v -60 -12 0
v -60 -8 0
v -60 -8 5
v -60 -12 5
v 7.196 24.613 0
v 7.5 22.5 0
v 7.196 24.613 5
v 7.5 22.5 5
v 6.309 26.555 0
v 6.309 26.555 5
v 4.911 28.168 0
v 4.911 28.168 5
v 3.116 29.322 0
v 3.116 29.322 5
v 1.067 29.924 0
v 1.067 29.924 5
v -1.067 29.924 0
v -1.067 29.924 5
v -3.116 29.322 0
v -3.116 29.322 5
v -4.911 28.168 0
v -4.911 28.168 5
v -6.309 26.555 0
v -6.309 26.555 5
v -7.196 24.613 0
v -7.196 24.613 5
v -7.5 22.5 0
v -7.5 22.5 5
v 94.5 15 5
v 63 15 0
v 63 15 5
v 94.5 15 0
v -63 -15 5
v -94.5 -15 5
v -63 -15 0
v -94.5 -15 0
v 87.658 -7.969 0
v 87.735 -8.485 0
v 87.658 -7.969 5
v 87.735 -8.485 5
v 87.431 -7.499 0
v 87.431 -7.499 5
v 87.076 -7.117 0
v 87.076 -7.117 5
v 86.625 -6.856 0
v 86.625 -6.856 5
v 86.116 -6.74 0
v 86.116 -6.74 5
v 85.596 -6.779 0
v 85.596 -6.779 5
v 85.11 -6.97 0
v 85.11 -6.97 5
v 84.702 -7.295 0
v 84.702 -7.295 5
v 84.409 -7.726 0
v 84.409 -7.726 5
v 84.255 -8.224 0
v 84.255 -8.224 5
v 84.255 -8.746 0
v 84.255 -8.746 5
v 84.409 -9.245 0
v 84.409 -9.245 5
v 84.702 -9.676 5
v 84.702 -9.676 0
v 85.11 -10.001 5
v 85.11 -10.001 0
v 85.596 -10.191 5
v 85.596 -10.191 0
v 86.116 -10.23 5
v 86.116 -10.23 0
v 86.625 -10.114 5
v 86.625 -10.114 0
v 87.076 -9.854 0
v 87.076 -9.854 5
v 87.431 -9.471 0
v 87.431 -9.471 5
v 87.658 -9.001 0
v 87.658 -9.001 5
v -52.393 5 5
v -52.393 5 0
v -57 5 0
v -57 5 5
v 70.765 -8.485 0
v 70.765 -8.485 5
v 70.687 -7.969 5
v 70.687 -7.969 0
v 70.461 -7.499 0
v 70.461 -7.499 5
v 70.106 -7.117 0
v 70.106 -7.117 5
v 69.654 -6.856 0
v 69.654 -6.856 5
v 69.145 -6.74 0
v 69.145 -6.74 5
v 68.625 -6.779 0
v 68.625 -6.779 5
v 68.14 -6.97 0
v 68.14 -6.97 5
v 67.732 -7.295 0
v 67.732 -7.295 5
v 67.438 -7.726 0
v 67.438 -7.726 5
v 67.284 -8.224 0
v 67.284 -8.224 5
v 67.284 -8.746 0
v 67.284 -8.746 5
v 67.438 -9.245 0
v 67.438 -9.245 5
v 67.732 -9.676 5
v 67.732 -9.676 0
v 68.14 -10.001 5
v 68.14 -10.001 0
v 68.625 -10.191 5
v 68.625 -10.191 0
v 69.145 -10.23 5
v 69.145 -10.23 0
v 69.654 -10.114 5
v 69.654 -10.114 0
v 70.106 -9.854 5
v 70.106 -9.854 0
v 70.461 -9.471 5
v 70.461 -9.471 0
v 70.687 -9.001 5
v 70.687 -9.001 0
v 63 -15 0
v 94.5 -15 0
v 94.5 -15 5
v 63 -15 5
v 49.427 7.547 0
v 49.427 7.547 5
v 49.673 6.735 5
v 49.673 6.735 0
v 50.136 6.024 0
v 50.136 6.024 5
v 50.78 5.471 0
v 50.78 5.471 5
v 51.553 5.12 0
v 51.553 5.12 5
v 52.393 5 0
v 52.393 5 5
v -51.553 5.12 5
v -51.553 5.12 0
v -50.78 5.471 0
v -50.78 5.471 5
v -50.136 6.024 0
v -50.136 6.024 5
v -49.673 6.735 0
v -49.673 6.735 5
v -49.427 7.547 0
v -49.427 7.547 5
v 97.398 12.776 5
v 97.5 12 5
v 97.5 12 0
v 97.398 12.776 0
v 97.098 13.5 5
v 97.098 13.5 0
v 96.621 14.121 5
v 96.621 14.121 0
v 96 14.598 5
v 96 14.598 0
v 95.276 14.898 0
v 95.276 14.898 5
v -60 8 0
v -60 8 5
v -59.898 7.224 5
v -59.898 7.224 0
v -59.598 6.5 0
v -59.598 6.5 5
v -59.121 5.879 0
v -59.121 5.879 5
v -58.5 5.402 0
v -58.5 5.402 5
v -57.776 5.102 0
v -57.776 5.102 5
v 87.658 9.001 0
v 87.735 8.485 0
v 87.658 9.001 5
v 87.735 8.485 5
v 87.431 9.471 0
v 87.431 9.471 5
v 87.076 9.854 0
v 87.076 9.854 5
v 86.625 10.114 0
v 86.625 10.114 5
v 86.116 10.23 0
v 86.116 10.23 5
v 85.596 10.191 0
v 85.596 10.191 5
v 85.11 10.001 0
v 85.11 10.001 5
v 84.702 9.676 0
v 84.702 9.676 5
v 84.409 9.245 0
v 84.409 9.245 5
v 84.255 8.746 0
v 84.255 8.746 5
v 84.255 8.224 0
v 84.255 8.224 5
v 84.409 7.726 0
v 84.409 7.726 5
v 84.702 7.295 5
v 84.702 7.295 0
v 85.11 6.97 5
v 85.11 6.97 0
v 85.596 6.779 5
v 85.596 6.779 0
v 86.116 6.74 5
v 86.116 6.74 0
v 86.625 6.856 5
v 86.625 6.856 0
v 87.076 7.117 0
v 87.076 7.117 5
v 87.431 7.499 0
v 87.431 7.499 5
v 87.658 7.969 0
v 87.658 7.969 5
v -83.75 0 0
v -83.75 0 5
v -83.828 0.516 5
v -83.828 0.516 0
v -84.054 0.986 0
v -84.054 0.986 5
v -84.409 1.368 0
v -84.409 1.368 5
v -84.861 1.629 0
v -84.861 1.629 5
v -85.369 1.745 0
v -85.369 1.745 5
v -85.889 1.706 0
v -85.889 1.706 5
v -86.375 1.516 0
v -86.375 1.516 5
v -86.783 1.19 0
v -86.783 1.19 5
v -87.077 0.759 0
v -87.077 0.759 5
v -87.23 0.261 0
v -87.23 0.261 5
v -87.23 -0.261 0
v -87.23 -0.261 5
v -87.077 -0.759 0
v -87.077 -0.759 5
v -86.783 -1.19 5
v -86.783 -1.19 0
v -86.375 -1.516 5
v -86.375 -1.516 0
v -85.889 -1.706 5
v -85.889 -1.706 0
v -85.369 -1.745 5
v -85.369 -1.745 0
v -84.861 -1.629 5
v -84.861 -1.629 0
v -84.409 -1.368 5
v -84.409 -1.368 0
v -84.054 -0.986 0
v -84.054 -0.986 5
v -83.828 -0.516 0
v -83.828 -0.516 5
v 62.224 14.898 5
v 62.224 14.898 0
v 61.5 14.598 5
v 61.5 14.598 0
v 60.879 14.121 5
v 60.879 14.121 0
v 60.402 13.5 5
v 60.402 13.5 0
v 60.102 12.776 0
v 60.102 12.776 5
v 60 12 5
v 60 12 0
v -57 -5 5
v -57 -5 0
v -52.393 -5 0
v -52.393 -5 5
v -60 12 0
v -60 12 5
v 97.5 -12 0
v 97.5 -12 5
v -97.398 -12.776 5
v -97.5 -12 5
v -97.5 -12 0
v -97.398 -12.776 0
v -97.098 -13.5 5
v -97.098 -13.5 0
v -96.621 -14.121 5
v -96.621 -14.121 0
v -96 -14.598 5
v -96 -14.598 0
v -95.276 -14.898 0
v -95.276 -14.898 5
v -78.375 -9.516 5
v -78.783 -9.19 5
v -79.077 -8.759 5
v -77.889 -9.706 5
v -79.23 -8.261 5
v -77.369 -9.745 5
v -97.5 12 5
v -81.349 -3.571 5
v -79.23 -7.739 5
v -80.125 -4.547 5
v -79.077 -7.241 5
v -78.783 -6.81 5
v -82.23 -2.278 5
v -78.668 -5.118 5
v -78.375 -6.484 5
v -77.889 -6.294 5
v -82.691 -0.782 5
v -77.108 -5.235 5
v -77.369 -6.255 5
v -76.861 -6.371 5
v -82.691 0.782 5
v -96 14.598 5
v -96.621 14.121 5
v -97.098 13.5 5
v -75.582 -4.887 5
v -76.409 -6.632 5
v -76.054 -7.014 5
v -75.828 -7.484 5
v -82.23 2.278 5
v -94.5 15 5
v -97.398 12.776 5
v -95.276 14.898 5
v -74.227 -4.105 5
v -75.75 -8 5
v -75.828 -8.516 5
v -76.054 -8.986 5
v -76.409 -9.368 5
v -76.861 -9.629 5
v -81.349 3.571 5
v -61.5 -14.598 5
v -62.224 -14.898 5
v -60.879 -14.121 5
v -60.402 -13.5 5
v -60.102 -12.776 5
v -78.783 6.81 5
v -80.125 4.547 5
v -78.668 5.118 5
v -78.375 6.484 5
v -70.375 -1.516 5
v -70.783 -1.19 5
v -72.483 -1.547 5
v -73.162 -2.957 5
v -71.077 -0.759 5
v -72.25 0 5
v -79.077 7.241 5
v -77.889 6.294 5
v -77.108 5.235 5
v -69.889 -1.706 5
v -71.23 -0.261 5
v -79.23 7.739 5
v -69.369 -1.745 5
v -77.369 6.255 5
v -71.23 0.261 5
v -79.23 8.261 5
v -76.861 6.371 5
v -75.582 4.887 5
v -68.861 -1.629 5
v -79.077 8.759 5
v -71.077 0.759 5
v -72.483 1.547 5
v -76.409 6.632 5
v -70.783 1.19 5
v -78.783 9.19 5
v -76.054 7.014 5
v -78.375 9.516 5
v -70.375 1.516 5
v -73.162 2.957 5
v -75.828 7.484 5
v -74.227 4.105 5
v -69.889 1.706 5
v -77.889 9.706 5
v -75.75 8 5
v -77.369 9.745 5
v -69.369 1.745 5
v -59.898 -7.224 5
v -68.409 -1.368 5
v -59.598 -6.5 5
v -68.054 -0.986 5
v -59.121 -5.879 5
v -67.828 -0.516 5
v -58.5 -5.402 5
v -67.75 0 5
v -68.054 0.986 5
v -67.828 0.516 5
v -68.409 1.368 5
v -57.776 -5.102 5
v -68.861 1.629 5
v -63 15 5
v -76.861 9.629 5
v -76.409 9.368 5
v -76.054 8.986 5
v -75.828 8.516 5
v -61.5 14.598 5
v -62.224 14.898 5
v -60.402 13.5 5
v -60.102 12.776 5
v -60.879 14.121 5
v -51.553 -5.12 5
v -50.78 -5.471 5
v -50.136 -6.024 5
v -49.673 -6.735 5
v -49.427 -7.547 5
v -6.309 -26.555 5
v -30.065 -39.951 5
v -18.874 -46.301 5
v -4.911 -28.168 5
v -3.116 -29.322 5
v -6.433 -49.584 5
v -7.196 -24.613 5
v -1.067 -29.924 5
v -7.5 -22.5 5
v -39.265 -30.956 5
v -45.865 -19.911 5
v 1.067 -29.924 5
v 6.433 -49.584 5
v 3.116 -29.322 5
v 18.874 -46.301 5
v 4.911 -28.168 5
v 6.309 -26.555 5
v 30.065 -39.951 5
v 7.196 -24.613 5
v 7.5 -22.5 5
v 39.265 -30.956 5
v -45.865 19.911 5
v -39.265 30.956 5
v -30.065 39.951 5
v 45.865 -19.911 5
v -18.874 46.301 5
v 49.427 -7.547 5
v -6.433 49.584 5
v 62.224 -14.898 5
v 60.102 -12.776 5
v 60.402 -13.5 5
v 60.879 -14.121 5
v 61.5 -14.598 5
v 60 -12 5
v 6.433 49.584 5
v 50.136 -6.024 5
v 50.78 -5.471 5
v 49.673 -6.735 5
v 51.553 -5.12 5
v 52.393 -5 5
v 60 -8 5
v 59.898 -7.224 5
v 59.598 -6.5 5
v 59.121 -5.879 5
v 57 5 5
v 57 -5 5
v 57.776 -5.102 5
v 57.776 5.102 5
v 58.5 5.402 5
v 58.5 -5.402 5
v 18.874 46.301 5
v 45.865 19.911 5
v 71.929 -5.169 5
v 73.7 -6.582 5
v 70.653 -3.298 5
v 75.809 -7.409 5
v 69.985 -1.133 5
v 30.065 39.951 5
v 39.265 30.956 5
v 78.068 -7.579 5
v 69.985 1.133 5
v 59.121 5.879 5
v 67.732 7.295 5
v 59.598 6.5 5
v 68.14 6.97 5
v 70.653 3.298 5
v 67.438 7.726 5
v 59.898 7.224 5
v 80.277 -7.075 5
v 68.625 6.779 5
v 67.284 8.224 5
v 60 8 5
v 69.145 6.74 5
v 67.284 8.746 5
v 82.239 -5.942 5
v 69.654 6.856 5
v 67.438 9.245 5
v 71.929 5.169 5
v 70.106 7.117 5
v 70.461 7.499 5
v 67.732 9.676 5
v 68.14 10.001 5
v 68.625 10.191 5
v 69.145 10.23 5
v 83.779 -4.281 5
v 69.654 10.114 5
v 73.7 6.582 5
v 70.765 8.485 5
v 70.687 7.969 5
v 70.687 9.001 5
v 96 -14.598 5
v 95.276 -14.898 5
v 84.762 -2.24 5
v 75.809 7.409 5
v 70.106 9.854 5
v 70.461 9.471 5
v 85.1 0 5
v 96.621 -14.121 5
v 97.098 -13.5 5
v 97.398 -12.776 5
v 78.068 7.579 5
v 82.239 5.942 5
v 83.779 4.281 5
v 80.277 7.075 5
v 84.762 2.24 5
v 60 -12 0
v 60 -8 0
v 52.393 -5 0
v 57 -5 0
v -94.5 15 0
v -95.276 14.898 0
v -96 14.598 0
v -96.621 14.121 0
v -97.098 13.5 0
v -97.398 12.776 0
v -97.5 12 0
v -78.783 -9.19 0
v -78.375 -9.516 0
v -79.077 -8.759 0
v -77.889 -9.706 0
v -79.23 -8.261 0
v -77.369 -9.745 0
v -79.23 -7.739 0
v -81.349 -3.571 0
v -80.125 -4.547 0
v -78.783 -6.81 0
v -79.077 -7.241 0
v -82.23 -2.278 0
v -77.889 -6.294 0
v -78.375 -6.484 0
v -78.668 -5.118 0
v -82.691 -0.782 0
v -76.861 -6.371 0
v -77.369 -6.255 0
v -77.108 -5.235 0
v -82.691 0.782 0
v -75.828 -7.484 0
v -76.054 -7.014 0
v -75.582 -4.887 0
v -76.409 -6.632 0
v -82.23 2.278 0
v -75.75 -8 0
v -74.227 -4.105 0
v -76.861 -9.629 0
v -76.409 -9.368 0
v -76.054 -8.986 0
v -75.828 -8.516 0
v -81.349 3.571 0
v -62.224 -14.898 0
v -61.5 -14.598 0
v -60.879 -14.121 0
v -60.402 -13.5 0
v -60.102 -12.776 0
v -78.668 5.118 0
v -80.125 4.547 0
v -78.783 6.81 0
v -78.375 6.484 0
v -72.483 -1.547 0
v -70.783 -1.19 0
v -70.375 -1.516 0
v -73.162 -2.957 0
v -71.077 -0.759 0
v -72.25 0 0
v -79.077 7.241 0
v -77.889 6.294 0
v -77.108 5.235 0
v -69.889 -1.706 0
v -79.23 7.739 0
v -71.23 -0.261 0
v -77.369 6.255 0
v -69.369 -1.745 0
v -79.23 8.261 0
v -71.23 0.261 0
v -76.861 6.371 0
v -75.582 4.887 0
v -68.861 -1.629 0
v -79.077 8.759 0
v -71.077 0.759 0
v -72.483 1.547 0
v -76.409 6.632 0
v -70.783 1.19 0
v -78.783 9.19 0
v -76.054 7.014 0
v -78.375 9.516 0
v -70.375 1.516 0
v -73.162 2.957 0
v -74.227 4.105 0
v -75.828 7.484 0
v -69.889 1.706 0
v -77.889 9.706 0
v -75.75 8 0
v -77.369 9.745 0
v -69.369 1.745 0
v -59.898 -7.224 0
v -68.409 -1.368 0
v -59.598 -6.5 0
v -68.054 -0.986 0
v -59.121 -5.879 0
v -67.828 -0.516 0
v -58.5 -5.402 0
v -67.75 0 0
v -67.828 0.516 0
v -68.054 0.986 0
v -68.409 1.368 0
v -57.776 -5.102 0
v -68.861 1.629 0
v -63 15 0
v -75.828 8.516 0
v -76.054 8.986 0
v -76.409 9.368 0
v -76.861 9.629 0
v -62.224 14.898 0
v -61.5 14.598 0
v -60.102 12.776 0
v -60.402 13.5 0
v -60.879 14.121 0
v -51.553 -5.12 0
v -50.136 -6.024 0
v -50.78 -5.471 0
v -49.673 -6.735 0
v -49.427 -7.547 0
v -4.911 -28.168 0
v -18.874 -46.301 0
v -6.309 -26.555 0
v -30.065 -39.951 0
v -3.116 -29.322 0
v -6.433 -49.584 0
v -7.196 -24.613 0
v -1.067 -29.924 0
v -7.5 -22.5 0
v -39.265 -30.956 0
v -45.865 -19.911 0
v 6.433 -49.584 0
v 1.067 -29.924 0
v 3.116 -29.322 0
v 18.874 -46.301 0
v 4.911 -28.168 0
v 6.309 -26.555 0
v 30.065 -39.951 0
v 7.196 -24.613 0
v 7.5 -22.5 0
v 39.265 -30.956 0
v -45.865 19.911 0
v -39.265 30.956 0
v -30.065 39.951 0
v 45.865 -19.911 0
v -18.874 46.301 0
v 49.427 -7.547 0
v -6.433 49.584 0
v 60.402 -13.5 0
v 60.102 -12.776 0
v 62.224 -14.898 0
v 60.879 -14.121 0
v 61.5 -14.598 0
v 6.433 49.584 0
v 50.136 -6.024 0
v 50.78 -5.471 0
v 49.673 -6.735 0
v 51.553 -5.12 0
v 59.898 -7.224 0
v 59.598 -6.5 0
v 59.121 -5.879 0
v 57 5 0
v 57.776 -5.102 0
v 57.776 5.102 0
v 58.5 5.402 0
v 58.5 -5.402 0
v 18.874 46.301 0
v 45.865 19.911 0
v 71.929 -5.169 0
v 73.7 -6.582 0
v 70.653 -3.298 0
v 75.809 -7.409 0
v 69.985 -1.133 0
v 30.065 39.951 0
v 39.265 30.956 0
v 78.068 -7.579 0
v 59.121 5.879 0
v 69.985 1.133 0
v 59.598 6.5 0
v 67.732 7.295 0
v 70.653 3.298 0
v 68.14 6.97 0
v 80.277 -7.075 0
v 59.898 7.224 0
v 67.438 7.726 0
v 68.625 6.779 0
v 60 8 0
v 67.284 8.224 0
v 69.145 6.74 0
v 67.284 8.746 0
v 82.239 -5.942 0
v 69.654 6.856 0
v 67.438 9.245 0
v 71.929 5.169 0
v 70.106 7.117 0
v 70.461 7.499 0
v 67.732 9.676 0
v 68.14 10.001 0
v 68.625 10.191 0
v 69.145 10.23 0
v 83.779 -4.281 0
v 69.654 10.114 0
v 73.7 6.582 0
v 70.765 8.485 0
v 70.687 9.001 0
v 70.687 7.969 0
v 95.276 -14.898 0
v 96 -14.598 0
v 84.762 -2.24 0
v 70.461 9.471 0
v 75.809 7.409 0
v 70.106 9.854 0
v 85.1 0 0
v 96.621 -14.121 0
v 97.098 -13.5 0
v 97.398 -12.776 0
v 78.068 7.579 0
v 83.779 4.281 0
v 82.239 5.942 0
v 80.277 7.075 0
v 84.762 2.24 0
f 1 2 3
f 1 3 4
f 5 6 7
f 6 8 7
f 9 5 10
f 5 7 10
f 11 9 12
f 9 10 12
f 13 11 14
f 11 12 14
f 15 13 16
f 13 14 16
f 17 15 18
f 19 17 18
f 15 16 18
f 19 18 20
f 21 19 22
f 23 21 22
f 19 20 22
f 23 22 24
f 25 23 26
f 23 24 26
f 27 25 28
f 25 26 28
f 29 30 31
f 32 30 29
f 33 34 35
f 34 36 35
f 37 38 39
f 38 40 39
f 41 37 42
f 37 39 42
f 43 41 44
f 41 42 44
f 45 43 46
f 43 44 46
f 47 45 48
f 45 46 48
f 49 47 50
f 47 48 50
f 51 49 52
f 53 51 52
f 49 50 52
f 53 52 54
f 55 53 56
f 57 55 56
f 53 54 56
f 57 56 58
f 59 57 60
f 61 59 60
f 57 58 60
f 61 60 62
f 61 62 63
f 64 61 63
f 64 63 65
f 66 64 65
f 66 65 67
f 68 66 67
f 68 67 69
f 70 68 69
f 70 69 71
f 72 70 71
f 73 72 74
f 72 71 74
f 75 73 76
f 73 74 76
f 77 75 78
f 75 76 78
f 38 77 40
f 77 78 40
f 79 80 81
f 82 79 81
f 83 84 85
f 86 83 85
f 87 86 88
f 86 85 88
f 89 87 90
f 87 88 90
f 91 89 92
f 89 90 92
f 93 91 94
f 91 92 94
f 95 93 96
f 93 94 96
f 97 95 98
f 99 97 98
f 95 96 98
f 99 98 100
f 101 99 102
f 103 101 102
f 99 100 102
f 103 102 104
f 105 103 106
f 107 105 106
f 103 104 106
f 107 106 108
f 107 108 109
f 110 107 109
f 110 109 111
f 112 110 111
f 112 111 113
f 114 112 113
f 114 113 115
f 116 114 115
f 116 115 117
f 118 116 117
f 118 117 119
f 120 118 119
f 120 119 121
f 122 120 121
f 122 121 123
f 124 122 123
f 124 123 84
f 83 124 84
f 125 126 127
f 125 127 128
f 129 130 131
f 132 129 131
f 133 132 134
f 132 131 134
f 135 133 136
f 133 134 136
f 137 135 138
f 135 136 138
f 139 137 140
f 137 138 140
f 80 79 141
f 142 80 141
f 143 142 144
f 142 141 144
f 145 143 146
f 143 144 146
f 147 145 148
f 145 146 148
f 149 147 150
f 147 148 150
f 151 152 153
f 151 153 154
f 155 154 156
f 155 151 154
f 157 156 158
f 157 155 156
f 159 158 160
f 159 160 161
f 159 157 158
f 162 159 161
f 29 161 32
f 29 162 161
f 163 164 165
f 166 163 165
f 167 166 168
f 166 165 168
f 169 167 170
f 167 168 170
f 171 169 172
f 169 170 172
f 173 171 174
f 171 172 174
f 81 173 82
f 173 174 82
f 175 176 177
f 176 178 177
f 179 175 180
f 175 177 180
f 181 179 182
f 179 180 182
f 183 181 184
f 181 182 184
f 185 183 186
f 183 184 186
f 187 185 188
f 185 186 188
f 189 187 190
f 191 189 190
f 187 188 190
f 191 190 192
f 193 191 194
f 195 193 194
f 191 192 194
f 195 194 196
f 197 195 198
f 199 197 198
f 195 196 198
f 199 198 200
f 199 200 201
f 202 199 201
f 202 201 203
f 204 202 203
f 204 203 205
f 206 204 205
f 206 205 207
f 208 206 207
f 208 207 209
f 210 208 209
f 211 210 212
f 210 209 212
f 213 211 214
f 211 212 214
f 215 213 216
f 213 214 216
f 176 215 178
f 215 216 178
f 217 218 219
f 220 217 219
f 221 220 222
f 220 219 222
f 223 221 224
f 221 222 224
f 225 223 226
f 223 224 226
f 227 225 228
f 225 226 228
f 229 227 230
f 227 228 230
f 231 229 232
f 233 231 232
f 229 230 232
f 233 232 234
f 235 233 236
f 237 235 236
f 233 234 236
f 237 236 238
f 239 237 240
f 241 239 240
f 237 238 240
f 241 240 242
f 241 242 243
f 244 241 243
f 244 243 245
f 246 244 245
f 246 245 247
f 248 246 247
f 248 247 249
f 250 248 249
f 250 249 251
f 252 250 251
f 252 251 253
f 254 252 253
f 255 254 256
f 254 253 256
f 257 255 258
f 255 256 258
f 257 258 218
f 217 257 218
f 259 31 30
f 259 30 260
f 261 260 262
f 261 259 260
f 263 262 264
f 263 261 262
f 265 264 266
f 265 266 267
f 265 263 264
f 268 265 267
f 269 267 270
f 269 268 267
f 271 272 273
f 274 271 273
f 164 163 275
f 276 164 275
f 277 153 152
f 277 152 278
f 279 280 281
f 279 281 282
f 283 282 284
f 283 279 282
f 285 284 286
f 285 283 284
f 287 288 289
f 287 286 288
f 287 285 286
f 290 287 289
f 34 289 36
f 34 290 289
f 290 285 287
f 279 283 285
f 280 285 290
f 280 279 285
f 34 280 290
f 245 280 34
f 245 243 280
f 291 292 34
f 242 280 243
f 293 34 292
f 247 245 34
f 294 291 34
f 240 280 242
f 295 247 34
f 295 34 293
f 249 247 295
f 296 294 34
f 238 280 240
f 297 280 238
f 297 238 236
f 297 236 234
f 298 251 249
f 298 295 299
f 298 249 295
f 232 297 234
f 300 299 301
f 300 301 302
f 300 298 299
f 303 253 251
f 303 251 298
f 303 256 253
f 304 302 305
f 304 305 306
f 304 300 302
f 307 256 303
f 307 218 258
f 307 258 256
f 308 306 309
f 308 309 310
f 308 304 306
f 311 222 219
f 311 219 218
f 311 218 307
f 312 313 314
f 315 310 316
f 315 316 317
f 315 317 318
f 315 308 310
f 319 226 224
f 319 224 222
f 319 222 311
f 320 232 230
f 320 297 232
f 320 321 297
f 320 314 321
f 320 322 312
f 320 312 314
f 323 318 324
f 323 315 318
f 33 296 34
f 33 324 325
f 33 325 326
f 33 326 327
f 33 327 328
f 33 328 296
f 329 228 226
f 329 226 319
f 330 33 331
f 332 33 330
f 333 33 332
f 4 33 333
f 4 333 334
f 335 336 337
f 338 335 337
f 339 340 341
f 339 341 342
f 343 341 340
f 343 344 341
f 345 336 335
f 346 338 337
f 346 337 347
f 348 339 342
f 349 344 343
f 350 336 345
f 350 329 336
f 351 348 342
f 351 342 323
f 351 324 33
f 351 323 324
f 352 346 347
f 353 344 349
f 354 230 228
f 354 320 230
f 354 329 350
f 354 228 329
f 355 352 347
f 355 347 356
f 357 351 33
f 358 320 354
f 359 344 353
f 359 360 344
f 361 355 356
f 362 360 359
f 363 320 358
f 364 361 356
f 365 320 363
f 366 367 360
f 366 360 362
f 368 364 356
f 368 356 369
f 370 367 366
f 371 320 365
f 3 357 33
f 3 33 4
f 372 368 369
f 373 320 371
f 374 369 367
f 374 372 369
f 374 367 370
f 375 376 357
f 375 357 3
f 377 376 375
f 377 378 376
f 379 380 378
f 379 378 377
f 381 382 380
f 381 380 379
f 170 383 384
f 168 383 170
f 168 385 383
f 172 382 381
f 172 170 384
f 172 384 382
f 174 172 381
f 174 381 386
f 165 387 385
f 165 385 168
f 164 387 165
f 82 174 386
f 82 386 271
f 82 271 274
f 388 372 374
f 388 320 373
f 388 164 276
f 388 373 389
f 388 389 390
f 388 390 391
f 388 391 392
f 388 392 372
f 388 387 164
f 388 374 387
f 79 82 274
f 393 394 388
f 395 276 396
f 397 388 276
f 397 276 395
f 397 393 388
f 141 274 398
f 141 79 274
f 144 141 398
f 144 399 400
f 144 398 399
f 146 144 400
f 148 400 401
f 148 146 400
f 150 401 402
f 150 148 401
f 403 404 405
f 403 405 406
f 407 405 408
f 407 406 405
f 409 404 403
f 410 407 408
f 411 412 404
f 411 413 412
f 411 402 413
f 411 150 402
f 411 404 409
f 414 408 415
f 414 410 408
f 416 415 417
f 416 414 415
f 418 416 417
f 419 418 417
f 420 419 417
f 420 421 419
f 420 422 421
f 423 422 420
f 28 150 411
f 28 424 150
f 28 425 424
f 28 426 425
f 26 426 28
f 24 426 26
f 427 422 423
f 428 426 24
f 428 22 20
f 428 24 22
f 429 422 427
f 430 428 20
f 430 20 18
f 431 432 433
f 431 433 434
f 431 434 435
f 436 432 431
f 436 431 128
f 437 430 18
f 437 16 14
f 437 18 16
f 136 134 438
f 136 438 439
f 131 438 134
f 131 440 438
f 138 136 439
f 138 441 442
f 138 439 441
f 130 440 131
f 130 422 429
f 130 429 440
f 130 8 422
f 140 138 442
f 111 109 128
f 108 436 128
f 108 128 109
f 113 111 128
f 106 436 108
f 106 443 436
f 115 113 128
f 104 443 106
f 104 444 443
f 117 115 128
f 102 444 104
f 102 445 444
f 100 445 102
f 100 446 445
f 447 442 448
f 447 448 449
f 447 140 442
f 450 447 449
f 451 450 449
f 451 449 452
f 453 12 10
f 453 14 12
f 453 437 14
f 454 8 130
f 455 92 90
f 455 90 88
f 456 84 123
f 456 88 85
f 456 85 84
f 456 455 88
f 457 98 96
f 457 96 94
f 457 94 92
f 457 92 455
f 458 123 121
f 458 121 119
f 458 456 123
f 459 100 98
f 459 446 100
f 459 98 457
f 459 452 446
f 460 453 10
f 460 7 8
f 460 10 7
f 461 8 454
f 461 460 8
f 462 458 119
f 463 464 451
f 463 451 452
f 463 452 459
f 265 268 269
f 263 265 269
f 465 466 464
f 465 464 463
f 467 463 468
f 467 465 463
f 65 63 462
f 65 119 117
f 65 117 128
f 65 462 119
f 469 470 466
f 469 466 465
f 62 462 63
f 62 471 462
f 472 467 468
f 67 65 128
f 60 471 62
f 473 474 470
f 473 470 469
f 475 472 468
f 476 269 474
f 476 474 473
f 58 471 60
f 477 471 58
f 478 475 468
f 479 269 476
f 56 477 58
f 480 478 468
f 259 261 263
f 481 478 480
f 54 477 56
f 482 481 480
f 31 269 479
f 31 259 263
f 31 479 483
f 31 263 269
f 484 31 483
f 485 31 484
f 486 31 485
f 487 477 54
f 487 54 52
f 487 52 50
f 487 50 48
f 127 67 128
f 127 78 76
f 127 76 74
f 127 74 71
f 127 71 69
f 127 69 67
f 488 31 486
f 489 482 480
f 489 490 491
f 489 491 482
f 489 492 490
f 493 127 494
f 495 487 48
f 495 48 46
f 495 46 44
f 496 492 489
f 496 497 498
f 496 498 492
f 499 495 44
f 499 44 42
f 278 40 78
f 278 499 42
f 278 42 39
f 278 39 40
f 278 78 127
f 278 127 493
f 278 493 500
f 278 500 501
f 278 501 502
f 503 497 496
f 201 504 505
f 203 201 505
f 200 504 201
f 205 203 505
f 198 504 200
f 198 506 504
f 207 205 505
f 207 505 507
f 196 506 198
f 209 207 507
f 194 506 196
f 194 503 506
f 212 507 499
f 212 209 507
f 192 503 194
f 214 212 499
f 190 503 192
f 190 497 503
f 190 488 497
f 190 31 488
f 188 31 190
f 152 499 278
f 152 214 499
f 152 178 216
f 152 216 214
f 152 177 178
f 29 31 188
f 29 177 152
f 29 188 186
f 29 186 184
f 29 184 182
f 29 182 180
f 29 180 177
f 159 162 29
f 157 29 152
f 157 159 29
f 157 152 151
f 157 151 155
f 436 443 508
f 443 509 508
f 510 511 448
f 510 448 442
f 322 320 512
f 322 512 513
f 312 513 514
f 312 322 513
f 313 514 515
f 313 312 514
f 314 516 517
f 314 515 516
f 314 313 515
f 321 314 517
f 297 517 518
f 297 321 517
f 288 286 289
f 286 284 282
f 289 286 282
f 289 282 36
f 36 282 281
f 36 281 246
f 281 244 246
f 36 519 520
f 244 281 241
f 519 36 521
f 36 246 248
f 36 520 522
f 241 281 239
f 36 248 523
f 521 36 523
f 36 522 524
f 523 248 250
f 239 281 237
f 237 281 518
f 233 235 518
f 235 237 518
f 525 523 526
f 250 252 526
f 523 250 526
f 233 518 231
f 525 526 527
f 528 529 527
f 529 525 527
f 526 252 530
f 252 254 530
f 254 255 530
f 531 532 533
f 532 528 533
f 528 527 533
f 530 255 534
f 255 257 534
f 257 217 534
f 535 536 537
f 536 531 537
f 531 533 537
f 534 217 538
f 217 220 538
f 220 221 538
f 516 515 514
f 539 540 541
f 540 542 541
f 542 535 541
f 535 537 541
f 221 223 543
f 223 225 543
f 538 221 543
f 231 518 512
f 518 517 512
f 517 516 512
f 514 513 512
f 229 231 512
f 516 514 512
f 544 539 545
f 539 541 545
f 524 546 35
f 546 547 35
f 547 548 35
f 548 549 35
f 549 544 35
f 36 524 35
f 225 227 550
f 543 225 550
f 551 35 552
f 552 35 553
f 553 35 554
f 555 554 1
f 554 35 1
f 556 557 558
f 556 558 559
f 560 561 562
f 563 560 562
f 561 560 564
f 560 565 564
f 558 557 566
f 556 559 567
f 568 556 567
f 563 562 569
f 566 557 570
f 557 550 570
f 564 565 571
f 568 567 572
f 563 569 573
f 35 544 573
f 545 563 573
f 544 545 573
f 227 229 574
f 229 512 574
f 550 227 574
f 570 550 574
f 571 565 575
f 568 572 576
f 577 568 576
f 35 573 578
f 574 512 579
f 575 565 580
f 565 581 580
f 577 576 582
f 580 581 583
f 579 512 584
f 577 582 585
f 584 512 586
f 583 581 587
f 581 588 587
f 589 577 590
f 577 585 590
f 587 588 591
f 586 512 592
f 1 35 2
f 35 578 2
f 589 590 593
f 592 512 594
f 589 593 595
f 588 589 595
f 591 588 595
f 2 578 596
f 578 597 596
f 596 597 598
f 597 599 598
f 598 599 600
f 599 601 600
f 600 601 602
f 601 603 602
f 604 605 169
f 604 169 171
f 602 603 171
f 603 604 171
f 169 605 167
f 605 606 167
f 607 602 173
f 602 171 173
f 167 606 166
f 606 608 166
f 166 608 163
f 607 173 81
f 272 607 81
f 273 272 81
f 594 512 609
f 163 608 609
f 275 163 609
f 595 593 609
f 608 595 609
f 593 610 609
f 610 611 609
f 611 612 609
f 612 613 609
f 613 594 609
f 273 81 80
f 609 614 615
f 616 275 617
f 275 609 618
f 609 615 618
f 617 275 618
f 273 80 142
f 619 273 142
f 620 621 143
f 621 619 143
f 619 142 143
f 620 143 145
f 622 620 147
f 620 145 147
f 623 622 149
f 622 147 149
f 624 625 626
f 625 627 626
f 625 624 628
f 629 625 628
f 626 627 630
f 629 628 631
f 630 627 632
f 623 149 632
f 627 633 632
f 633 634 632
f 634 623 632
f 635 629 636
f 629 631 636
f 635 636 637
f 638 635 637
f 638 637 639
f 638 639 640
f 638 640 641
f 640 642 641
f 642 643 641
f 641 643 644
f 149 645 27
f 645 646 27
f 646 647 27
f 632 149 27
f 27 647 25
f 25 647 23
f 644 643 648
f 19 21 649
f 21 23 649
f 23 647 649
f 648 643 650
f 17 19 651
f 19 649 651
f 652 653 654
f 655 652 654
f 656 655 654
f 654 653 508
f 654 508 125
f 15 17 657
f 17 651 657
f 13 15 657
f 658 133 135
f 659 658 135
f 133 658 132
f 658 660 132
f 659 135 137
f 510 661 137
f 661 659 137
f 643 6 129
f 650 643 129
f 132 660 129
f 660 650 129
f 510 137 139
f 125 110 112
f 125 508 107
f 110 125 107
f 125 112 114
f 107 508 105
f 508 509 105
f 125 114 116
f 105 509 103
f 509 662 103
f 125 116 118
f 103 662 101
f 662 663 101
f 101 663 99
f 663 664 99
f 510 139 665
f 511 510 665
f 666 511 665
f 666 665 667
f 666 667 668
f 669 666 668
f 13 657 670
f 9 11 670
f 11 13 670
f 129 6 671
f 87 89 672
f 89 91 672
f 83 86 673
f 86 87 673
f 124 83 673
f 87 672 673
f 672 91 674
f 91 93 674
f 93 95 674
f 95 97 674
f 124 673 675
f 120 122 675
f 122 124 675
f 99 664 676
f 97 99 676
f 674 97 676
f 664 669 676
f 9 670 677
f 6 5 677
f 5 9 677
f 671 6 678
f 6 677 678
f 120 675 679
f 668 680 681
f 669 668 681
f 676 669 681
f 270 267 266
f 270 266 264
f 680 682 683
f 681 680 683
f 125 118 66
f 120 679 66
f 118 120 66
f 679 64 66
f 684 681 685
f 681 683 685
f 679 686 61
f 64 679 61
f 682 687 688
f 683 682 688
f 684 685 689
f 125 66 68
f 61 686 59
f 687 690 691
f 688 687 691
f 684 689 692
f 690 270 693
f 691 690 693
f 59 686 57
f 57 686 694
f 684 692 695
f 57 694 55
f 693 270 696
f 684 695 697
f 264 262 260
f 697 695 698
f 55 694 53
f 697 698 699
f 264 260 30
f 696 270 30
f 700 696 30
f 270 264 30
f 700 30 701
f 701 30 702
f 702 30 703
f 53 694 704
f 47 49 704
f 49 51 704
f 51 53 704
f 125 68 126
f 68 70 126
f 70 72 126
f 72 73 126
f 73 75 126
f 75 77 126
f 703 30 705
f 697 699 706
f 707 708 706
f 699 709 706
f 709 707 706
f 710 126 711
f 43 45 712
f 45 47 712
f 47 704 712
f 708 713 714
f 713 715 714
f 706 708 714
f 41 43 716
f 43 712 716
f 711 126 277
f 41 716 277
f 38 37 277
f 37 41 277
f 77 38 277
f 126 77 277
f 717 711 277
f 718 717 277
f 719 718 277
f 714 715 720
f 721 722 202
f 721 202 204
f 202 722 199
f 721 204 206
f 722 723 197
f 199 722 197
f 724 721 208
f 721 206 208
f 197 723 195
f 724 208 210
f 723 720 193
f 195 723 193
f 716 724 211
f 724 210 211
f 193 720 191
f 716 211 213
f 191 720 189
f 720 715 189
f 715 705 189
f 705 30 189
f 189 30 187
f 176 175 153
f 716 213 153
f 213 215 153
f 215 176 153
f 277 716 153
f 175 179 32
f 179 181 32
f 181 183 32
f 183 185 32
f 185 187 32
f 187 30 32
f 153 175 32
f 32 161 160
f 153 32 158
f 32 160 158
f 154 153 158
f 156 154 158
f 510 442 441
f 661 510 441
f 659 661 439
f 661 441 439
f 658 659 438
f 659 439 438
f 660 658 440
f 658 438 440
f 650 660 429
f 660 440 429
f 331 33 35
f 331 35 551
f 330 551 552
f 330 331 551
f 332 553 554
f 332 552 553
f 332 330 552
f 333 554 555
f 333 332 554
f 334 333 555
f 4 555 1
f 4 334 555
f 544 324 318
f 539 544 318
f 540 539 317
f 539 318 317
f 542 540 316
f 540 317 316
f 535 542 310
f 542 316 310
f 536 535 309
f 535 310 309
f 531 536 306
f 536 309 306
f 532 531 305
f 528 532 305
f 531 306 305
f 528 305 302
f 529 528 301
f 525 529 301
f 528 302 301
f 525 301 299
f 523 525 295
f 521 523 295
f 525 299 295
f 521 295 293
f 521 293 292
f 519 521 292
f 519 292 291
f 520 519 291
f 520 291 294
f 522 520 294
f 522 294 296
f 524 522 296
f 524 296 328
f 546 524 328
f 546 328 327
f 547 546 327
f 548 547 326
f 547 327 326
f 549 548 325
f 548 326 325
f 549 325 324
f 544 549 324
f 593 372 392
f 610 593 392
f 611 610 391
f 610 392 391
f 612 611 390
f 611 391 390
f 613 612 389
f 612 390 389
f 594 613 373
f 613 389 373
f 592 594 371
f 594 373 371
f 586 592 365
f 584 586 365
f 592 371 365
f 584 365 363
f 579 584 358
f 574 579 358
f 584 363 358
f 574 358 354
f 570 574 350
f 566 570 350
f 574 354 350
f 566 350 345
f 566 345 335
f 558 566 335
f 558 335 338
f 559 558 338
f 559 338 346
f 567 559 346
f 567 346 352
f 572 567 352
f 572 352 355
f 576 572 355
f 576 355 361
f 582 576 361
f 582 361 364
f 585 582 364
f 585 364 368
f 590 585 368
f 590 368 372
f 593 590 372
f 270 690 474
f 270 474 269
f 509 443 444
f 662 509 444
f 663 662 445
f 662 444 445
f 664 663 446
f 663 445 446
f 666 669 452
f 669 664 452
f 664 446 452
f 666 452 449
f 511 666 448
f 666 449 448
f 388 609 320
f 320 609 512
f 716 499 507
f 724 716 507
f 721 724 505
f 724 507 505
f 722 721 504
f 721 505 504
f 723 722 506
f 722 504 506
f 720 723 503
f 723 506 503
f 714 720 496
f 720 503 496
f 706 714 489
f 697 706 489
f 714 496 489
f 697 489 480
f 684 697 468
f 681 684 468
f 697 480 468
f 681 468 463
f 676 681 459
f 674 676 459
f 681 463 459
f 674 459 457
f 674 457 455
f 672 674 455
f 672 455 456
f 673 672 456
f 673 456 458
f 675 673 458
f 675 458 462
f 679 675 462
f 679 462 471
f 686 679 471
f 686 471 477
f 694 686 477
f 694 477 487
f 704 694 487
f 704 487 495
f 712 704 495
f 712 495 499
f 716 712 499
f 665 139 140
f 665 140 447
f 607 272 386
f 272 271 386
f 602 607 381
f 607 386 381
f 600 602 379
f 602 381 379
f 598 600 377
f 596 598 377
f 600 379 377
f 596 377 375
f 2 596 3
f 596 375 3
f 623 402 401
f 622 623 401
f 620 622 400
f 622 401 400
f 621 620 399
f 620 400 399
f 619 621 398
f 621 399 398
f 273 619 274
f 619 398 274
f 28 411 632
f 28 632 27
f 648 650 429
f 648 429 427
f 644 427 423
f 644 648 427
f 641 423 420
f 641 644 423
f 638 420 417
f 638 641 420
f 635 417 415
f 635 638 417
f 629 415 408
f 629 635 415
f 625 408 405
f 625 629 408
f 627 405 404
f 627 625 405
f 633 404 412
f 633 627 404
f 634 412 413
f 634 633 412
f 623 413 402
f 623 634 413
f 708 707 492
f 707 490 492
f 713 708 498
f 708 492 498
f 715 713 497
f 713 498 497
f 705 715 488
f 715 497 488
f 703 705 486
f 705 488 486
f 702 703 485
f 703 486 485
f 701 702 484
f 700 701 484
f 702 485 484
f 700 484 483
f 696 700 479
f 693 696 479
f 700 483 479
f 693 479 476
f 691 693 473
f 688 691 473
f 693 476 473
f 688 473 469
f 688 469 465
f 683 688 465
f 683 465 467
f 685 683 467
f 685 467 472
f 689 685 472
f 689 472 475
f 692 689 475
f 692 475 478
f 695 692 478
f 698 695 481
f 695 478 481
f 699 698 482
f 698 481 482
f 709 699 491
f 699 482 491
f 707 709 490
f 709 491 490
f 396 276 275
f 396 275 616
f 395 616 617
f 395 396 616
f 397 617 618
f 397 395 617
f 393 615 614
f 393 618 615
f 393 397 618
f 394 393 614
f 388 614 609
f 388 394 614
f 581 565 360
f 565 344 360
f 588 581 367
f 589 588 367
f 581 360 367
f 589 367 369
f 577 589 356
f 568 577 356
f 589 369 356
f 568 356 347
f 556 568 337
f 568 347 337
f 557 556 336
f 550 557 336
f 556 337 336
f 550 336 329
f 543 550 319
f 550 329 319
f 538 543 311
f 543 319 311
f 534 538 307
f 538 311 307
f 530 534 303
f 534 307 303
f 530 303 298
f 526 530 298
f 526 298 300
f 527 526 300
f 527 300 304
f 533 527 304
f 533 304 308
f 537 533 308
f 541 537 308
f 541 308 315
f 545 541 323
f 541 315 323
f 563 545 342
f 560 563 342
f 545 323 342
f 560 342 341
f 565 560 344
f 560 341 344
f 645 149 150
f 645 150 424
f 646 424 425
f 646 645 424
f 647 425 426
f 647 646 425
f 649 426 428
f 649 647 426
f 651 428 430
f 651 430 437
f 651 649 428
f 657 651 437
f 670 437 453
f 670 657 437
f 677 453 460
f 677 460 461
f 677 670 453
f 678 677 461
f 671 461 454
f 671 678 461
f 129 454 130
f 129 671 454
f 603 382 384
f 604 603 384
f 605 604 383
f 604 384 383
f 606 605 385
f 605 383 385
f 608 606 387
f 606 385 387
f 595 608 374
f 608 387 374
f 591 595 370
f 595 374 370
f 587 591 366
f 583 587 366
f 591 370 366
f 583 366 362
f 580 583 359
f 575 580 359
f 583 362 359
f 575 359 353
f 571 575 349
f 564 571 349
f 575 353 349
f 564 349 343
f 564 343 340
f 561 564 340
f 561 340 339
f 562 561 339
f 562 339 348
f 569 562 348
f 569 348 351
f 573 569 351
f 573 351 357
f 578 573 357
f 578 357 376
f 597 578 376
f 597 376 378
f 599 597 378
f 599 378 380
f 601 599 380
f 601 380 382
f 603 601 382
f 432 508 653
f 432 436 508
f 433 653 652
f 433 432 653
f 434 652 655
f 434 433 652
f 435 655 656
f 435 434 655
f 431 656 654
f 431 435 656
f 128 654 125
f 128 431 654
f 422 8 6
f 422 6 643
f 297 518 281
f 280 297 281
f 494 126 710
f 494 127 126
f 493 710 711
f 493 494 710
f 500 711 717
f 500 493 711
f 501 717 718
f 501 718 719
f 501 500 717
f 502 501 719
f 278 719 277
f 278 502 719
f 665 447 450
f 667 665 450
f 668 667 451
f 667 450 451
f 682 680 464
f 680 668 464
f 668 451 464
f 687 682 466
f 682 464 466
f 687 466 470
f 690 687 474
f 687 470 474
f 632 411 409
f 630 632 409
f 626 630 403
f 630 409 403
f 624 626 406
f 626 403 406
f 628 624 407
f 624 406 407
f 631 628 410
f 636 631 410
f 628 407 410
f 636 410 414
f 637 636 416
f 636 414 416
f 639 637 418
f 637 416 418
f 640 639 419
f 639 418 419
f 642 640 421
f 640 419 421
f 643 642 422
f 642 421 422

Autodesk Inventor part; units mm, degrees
ref_plane "YZ Plane" through (0, 0, 0) normal (1, 0, 0) x (0, 1, 0)
ref_plane "XZ Plane" through (0, 0, 0) normal (0, 1, 0) x (-1, 0, 0)
ref_plane "XY Plane" through (0, 0, 0) normal (0, 0, 1) x (1, 0, 0)
sketch "Sketch1" plane through (0, 0, 0) normal (0, 0, 1) x (1, 0, 0)
  circle A0 centre (0, 0) radius 50
  line L0 (0, 0) -> (0, 20) construction
  line L1 (2.5, 15) -> (97.5, 15)
  line L2 (97.5, 15) -> (97.5, -15)
  line L3 (97.5, -15) -> (2.5, -15)
  line L4 (2.5, -15) -> (2.5, 15)
  line L5 (2.5, 15) -> (97.5, -15) construction
  line L6 (97.5, 15) -> (2.5, -15) construction
  line L7 (40, 5) -> (60, 5)
  line L8 (60, 5) -> (60, -5)
  line L9 (60, -5) -> (40, -5)
  line L10 (40, -5) -> (40, 5)
  line L11 (40, 5) -> (60, -5) construction
  line L12 (60, 5) -> (40, -5) construction
  line L13 (60, 5) -> (60, 15)
  line L14 (60, -5) -> (60, -15)
  line L15 (-2.5, 15) -> (-97.5, 15)
  line L16 (-97.5, 15) -> (-97.5, -15)
  line L17 (-97.5, -15) -> (-2.5, -15)
  line L18 (-2.5, -15) -> (-2.5, 15)
  line L19 (-2.5, 15) -> (-97.5, -15) construction
  line L20 (-97.5, 15) -> (-2.5, -15) construction
  line L21 (-40, 5) -> (-60, 5)
  line L22 (-60, 5) -> (-60, -5)
  line L23 (-60, -5) -> (-40, -5)
  line L24 (-40, -5) -> (-40, 5)
  line L25 (-40, 5) -> (-60, -5) construction
  line L26 (-60, 5) -> (-40, -5) construction
  line L27 (-60, 5) -> (-60, 15)
  line L28 (-60, -5) -> (-60, -15)
  point P0 (50, 0)
  point P1 (50, 0)
  point P2 (-50, 0)
  point P3 (-50, 0)
  point P4 (49.7494, 5)
  point P5 (49.7494, -5)
  point P6 (-49.7494, -5)
  point P7 (-49.7494, 5)
  dimension "d0" = 100
  dimension "d3" = 20
  dimension "d17" = 95
  dimension "d18" = 30
  dimension "d19" = 20
  dimension "d20" = 10
extrude "Extrusion1" add sketch "Sketch1" along normal blind 5 contours A0 L9 L10 L7 | A0 L7 L8 L9 | L7 L10 L9 A0 L3 L4 L1 | L1 L4 L3 A0 L17 L18 L15 | L13 L1 L2 L3 L14 L8 | L15 L18 L17 A0 L23 L24 L21 | L21 L24 L23 A0 | A0 L23 L22 L21 | L27 L22 L28 L17 L16 L15
sketch "Sketch2" plane through (0, 0, 5) normal (0, 0, 1) x (1, 0, 0)
  line L0 (0, 0) -> (-77.5, 0) construction
  circle A0 centre (-77.5, 0) radius 5.25
  line L1 (0, 0) -> (0, 20) construction
  circle A1 centre (-77.5, 0) radius 8
  circle A2 centre (-69.5, 0) radius 1.75
  circle A3 centre (-77.5, 8) radius 1.75
  circle A4 centre (-85.5, 0) radius 1.75
  circle A5 centre (-77.5, -8) radius 1.75
  circle A6 centre (77.5, 0) radius 12
  line L2 (65, 12.5) -> (90, 12.5)
  line L3 (90, 12.5) -> (90, -12.5)
  line L4 (90, -12.5) -> (65, -12.5)
  line L5 (65, -12.5) -> (65, 12.5)
  line L6 (65, 12.5) -> (90, -12.5) construction
  line L7 (90, 12.5) -> (65, -12.5) construction
  line L8 (90, 12.5) -> (65, -12.5)
  circle A7 centre (85.9853, 8.4853) radius 1.75
  circle A8 centre (69.0147, 8.4853) radius 1.75
  circle A9 centre (69.0147, -8.4853) radius 1.75
  circle A10 centre (85.9853, -8.4853) radius 1.75
  circle A11 centre (77.5, 0) radius 7.6
  dimension "d26" = 16
  dimension "d70" = 24
  dimension "d6" = 77.5
  dimension "d7" = 10.5
  dimension "d8" = 20
  dimension "d27" = 3.5
  dimension "d30" = 360
  dimension "d71" = 25
  dimension "d72" = 25
  dimension "d73" = 3.5
  dimension "d76" = 360
  dimension "d78" = 15.2
extrude "Extrusion2" cut sketch "Sketch2" against normal blind 7 contours A0 | A1 A2 | A1 A2 | A3 A1 | A1 A3 | A5 A1 | A1 A5 | A4 A1 | A1 A4 | A7 L8 A6 | A6 L8 A7 | A10 A6 | A6 A10 | L8 A7 A6 | A6 A7 L8 | A11 L8 | L8 A11 | A9 L8 A6 | A6 L8 A9 | A8 A6 | A6 A8 | L8 A9 A6 | A6 A9 L8
fillet "Fillet1" radius 3 16 edges at (-60, 5, 2.5) (-60, 15, 2.5) (-49.7494, 5, 2.5) (-60, -5, 2.5) (-60, -15, 2.5) (-49.7494, -5, 2.5) (-97.5, -15, 2.5) (-97.5, 15, 2.5) (97.5, 15, 2.5) (97.5, -15, 2.5) (60, -15, 2.5) (60, 15, 2.5) (60, -5, 2.5) (60, 5, 2.5) (49.7494, 5, 2.5) (49.7494, -5, 2.5)
sketch "Sketch4" plane through (0, 0, 5) normal (0, 0, 1) x (1, 0, 0)
  line L0 (-7.5, 22.5) -> (7.5, 22.5)
  line L1 (7.5, 22.5) -> (7.5, -22.5)
  line L2 (7.5, -22.5) -> (-7.5, -22.5)
  line L3 (-7.5, -22.5) -> (-7.5, 22.5)
  line L4 (-7.5, 22.5) -> (7.5, -22.5) construction
  line L5 (7.5, 22.5) -> (-7.5, -22.5) construction
  circle A0 centre (0, -22.5) radius 7.5
  circle A1 centre (0, 22.5) radius 7.5
  point P0 (0, 0)
  point P1 (7.5, 22.5)
  dimension "d79" = 15
  dimension "d80" = 45
  dimension "d81" = 15
  dimension "d82" = 15
extrude "Extrusion3" cut sketch "Sketch4" against normal blind 10
properties part number "TAPA OPCION 3"
